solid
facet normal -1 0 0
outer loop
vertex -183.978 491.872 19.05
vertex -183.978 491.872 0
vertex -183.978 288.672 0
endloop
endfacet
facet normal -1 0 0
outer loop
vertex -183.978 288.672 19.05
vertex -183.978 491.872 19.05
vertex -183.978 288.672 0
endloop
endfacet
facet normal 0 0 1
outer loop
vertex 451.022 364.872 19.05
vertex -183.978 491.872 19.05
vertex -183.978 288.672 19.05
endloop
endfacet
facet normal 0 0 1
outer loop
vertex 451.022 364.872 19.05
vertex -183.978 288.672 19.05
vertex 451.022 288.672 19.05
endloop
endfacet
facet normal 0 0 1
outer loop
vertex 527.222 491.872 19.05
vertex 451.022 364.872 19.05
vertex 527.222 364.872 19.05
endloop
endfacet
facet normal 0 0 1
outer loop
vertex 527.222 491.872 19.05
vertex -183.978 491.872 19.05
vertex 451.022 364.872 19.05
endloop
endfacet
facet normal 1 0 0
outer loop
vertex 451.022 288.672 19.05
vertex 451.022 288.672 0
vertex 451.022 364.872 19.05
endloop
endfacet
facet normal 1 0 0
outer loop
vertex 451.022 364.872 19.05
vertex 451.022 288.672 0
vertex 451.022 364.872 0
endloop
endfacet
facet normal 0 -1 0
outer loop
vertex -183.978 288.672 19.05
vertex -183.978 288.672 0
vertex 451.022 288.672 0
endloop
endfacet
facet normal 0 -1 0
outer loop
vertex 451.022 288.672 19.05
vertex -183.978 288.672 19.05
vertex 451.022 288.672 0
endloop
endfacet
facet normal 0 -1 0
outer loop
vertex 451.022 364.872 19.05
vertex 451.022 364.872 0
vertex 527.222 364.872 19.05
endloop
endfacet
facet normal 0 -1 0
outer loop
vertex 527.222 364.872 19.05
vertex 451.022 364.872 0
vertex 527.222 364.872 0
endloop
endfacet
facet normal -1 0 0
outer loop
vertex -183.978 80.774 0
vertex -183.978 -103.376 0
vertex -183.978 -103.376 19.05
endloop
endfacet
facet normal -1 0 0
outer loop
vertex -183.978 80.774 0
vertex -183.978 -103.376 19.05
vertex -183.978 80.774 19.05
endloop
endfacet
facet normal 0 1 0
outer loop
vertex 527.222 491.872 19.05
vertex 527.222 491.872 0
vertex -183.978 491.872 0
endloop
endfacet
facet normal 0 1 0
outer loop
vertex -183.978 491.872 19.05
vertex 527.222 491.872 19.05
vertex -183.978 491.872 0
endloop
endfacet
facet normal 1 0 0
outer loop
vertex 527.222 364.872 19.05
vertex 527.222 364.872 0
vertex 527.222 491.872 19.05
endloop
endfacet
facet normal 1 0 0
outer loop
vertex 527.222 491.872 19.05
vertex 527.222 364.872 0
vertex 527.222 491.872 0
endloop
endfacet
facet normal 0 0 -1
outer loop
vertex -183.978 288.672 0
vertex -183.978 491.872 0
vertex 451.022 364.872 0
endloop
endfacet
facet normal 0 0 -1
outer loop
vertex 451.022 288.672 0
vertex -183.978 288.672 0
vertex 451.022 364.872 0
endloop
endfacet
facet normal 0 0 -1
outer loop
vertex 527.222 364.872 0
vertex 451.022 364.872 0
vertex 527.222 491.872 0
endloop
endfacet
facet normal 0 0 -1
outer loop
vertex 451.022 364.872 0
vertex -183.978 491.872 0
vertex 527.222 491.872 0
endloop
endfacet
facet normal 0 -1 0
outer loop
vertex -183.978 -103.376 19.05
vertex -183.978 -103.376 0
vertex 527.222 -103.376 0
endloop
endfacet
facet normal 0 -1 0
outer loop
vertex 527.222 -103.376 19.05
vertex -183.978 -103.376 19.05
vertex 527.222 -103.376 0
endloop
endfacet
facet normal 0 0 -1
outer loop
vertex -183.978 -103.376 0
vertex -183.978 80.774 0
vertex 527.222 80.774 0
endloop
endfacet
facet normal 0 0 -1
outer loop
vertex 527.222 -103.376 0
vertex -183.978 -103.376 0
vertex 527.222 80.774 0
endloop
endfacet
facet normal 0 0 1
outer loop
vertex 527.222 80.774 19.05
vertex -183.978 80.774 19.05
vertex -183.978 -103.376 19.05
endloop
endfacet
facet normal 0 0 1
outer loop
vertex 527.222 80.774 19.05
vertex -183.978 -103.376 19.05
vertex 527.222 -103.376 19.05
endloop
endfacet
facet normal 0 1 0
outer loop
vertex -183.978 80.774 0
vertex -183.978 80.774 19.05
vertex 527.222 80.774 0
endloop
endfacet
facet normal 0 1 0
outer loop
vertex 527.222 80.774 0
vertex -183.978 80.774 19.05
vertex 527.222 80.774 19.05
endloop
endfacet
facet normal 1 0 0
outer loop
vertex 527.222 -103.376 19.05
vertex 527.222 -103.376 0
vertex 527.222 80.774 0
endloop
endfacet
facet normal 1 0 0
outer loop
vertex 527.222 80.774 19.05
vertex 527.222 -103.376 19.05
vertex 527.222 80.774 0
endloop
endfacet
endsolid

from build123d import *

# Parameters (mm, degrees)
F0_W     = 711.2
F0_H     = 203.2
F1_DEPTH = 19.05
F2_DEPTH = 19.05
F0_W_2   = 76.2
F0_H_2   = 76.2
F3_DEPTH = 19.05
F4_W     = 711.2
F4_H     = 19.05
F5_DEPTH = 19.051


with BuildPart() as f1:
    # F0 (on Top) → F1 (new body)
    with BuildSketch(Plane.XY):
        with Locations((171.622429, -1.776095)):
            Rectangle(F0_W, F0_H)
    extrude(amount=F1_DEPTH)

    # F4 (on face) → F5 (cut, through all)
    with BuildSketch(Plane.XY.offset(19.05)):
        with Locations((171.622429, 90.298905)):
            Rectangle(F4_W, F4_H)
    extrude(amount=-F5_DEPTH, mode=Mode.SUBTRACT)


with BuildPart() as f2:
    # F0 (on Top) → F2 (new body)
    with BuildSketch(Plane.XY):
        Polygon((-183.977571, 491.872239), (-183.977571, 288.672239), (451.022429, 288.672239), (451.022429, 364.872239), (527.222429, 364.872239), (527.222429, 491.872239), align=None)
    extrude(amount=F2_DEPTH)


with BuildPart() as f3:
    # F0 (on Top) → F3 (new body)
    with BuildSketch(Plane.XY):
        with Locations((489.122429, 326.772239)):
            Rectangle(F0_W_2, F0_H_2)
    extrude(amount=F3_DEPTH)


solid = Compound([f1.part, f2.part])
